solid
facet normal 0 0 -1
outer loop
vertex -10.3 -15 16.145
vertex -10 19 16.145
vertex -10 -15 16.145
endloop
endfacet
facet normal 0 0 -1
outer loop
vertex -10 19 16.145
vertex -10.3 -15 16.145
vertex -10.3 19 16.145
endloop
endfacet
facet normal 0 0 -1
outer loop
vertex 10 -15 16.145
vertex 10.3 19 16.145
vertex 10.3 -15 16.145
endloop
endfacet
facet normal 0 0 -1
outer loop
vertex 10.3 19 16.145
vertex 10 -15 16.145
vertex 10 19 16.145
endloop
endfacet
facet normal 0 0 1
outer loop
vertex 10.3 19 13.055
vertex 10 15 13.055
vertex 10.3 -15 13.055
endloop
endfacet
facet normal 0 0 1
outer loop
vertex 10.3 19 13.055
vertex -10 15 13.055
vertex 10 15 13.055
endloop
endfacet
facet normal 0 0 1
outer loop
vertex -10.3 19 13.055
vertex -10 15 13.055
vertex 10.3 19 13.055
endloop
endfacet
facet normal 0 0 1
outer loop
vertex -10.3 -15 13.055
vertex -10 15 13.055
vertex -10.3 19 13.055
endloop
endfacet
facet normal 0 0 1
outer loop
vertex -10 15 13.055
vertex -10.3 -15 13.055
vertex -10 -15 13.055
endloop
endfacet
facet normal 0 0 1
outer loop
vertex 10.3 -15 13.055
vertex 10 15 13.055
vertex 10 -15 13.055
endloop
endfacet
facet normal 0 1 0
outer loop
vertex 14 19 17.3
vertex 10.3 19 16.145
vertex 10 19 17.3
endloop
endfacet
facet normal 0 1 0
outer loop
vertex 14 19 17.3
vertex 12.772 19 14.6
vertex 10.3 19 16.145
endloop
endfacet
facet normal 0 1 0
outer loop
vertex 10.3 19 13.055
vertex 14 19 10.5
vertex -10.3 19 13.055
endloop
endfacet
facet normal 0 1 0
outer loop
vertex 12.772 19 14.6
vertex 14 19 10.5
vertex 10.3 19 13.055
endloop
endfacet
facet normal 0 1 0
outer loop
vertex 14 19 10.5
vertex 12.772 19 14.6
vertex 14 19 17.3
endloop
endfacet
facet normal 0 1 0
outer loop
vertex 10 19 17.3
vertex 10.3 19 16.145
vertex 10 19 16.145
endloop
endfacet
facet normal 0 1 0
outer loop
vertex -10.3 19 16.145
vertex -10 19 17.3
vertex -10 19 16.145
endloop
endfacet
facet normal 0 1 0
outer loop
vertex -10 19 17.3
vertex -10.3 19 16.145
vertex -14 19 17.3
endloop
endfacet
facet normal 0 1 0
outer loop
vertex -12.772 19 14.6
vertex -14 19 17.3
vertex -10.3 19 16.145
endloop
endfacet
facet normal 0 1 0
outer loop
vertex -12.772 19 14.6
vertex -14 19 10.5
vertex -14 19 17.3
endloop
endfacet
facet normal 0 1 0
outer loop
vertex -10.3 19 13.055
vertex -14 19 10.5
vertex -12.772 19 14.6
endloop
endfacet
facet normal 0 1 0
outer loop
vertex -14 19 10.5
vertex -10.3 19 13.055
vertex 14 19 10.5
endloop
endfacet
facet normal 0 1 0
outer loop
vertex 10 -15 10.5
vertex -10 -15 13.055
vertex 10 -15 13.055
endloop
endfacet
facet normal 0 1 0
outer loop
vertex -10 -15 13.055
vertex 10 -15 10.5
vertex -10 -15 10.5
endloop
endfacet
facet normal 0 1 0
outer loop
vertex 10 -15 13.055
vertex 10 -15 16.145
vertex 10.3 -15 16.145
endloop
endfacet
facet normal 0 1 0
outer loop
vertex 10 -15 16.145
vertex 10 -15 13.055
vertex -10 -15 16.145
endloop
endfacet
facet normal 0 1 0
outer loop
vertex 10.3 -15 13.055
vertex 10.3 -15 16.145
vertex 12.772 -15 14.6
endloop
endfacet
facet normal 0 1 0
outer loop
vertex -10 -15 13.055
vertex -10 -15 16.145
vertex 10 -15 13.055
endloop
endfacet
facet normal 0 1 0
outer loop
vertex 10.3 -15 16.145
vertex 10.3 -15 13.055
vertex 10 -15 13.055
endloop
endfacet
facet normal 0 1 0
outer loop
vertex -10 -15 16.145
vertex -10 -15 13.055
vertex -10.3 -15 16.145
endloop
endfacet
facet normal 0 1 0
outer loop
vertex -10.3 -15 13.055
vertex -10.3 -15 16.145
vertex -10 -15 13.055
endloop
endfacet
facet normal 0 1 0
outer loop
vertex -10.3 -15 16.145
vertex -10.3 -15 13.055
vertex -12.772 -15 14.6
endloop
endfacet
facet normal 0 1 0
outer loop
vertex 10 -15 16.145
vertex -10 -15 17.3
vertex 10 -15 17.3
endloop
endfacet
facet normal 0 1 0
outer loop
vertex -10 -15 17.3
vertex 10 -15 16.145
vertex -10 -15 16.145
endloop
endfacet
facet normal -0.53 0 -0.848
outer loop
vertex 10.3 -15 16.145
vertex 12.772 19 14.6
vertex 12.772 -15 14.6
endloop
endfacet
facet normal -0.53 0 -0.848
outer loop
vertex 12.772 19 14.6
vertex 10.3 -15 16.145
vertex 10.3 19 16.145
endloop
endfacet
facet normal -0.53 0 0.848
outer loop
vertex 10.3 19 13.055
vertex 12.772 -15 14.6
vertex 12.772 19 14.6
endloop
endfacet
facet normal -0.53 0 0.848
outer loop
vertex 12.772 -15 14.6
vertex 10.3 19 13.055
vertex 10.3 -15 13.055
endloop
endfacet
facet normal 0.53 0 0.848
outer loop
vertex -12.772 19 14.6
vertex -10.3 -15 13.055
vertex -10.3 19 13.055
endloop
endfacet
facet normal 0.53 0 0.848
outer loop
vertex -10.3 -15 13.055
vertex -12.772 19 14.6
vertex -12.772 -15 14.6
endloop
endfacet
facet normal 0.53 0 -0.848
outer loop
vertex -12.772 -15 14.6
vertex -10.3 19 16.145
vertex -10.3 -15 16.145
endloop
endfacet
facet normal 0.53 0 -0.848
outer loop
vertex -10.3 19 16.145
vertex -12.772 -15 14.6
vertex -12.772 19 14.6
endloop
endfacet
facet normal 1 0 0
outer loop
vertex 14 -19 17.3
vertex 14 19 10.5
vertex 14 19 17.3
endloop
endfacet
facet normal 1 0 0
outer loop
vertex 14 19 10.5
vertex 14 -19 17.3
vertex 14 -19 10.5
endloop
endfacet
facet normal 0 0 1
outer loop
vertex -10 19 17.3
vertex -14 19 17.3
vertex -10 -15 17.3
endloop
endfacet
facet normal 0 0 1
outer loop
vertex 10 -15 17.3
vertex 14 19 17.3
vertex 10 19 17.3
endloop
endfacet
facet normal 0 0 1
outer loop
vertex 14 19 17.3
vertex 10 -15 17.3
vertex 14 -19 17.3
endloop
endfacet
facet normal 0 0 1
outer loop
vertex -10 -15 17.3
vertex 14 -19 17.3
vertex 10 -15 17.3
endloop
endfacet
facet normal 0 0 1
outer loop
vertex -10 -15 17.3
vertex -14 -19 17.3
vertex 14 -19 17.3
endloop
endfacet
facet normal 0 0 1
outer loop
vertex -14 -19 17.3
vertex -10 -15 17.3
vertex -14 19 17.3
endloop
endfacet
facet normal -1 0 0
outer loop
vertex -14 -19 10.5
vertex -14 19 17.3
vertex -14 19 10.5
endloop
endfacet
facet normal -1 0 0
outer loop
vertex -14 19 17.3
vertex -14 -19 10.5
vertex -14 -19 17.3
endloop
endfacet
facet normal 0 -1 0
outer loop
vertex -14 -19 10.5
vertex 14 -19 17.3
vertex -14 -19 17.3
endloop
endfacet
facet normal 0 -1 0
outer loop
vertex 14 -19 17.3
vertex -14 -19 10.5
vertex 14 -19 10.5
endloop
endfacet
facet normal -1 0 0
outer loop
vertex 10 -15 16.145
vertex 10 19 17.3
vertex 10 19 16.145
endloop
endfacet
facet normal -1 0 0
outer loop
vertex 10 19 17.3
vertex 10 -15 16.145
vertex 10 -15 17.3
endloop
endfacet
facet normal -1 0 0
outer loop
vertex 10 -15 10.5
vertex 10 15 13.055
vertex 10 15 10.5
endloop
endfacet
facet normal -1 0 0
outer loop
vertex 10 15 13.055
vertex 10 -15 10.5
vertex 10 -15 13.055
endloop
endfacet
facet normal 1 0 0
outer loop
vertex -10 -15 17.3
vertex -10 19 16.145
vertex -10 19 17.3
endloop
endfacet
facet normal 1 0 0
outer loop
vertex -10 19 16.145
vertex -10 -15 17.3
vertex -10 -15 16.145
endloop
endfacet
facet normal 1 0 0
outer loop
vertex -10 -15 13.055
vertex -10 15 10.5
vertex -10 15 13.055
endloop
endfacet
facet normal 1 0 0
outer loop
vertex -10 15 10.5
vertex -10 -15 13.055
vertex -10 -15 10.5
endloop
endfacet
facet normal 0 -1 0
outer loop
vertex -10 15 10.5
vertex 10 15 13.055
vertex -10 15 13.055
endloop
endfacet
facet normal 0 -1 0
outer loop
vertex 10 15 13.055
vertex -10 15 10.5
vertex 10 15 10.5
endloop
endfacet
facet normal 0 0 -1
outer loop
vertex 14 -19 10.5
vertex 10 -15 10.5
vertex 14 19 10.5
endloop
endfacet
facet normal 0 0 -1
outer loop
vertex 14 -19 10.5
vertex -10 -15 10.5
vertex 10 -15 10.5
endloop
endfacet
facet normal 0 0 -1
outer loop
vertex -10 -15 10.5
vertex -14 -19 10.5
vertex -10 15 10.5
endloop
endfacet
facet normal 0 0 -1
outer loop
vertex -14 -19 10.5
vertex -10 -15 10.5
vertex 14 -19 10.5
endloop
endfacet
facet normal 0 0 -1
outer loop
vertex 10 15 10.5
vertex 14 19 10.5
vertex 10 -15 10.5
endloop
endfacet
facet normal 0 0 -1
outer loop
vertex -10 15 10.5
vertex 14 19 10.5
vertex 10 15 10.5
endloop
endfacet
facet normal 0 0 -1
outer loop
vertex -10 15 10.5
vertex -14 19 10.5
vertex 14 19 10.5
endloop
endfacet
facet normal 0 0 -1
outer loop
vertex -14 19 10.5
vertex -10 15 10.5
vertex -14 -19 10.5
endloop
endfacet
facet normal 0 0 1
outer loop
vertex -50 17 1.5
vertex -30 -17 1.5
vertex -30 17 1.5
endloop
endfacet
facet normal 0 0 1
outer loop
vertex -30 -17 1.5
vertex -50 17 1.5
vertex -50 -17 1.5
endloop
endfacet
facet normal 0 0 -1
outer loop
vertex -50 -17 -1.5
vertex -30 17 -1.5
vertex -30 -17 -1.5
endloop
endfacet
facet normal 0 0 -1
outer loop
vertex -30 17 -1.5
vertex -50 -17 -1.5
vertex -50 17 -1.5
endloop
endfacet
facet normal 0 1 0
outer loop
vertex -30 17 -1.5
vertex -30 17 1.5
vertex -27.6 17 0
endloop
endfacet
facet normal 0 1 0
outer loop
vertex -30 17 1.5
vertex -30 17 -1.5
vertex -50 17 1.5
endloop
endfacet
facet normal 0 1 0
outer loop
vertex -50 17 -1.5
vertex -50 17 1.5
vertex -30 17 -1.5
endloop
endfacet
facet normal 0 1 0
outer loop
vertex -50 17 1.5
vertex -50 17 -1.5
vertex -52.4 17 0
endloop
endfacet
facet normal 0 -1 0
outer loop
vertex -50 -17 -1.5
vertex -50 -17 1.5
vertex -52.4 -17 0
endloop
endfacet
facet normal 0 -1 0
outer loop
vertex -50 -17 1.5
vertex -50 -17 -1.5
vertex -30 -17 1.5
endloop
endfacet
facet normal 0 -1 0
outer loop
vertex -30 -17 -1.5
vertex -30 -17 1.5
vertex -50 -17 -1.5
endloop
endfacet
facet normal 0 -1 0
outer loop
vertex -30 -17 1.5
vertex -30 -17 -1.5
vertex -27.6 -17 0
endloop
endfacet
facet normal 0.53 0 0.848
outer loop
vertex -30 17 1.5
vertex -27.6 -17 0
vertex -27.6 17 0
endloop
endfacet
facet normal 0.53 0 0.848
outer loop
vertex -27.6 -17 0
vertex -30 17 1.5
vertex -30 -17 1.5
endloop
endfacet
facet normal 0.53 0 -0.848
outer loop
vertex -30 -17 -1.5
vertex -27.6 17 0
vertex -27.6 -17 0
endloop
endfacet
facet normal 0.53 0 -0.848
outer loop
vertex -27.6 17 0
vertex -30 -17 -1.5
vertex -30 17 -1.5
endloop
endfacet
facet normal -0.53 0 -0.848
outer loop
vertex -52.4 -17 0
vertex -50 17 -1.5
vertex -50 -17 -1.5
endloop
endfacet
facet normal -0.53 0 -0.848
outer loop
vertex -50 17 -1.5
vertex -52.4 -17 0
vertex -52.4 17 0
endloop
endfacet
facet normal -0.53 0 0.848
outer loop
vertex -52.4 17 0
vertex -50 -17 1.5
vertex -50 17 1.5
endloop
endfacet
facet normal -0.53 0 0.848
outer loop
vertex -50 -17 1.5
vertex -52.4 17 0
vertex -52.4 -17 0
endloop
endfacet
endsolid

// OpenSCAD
wall_thickness = 4;
base_thickness = 1.6;
box_length = 30;
box_width = 20;
box_height = 15;

lid_triangle_height = 2.4;
lid_thickness = 3;
lid_length = box_length + wall_thickness;

translate([0,0,box_height/2]) box();
translate([-40, 0, 0]) lid();

module box()
{
    box_full_width = box_width + 2*wall_thickness;
    box_full_length = box_length + 2*wall_thickness;
    box_full_height = box_height + base_thickness + lid_thickness;
    
    difference()
    {
        //main box
        cube([box_full_width, box_full_length, box_full_height], center=true);
        
        //main cutout
        translate([-box_width/2, -box_length/2, -box_height/2]) cube([box_width, box_length, box_height+20]);
        
        //cutout for lid
        //4% larger in x and z to provide some tolerance for shrinkage and allow easier sliding
        translate([0,wall_thickness/2,box_height/2-0.4]) scale([1.03, 1, 1.03]) lid();
         translate([-box_width/2,box_length/2,box_height/2]) cube([box_width, wall_thickness*3, 10]);
       
        
        //These changes only save about 4 minutes (estimated by cura)
        //cutout in base to speed up printing
        //translate([0,0,-box_full_height/2]) cube([box_width*2/3, box_length*2/3, 10], center=true);
        
        //cutout in front and back walls to speed up printing
        //translate([0,0,0]) cube([box_width*0.6, box_length*2, box_height], center=true);
        //translate([0,-box_length/2,box_height/2]) cube([box_width*0.6, wall_thickness*3, 10], center=true);
         
        translate([0,0,-12]) cube([40, 40, 30], center=true);
    }
    
   
}

module lid()
{
    //main body of the lid
    cube([box_width, lid_length, lid_thickness], center=true);
    
    //right triangle bit
    translate([box_width/2, -lid_length/2, -lid_thickness/2]) rotate([90,0,90]) prism_isos(lid_length, lid_thickness, lid_triangle_height);
    
    //left triangle bit
    translate([-box_width/2, lid_length/2, -lid_thickness/2]) rotate([90,0,-90]) prism_isos(lid_length, lid_thickness, lid_triangle_height);
}

//from https://en.wikibooks.org/wiki/OpenSCAD_User_Manual/Primitive_Solids#polyhedron
//makes 3D triangles
module prism_isos(l, w, h){
   polyhedron(
           points=[[0,0,0], [l,0,0], [l,w,0], [0,w,0], [0,w/2,h], [l,w/2,h]],
           faces=[[0,1,2,3],[5,4,3,2],[0,4,5,1],[0,3,4],[5,2,1]]
           );
  
}

module triangle_mount(base, height, length)
{
    translate([-length/2,0,base/2]) rotate([90,0,0]) union(){
        //triangle portion
        //rotate([90,0,-90]) 
        translate([0,-base/2,0]) prism_isos(length,base,height);
        
        //rectangular support
        //rotate([0,90,0])
        //translate([-length/2,0,base]) 
        translate([length/2,0,-base/2]) cube([length,base,base], center=true);
    }
}
